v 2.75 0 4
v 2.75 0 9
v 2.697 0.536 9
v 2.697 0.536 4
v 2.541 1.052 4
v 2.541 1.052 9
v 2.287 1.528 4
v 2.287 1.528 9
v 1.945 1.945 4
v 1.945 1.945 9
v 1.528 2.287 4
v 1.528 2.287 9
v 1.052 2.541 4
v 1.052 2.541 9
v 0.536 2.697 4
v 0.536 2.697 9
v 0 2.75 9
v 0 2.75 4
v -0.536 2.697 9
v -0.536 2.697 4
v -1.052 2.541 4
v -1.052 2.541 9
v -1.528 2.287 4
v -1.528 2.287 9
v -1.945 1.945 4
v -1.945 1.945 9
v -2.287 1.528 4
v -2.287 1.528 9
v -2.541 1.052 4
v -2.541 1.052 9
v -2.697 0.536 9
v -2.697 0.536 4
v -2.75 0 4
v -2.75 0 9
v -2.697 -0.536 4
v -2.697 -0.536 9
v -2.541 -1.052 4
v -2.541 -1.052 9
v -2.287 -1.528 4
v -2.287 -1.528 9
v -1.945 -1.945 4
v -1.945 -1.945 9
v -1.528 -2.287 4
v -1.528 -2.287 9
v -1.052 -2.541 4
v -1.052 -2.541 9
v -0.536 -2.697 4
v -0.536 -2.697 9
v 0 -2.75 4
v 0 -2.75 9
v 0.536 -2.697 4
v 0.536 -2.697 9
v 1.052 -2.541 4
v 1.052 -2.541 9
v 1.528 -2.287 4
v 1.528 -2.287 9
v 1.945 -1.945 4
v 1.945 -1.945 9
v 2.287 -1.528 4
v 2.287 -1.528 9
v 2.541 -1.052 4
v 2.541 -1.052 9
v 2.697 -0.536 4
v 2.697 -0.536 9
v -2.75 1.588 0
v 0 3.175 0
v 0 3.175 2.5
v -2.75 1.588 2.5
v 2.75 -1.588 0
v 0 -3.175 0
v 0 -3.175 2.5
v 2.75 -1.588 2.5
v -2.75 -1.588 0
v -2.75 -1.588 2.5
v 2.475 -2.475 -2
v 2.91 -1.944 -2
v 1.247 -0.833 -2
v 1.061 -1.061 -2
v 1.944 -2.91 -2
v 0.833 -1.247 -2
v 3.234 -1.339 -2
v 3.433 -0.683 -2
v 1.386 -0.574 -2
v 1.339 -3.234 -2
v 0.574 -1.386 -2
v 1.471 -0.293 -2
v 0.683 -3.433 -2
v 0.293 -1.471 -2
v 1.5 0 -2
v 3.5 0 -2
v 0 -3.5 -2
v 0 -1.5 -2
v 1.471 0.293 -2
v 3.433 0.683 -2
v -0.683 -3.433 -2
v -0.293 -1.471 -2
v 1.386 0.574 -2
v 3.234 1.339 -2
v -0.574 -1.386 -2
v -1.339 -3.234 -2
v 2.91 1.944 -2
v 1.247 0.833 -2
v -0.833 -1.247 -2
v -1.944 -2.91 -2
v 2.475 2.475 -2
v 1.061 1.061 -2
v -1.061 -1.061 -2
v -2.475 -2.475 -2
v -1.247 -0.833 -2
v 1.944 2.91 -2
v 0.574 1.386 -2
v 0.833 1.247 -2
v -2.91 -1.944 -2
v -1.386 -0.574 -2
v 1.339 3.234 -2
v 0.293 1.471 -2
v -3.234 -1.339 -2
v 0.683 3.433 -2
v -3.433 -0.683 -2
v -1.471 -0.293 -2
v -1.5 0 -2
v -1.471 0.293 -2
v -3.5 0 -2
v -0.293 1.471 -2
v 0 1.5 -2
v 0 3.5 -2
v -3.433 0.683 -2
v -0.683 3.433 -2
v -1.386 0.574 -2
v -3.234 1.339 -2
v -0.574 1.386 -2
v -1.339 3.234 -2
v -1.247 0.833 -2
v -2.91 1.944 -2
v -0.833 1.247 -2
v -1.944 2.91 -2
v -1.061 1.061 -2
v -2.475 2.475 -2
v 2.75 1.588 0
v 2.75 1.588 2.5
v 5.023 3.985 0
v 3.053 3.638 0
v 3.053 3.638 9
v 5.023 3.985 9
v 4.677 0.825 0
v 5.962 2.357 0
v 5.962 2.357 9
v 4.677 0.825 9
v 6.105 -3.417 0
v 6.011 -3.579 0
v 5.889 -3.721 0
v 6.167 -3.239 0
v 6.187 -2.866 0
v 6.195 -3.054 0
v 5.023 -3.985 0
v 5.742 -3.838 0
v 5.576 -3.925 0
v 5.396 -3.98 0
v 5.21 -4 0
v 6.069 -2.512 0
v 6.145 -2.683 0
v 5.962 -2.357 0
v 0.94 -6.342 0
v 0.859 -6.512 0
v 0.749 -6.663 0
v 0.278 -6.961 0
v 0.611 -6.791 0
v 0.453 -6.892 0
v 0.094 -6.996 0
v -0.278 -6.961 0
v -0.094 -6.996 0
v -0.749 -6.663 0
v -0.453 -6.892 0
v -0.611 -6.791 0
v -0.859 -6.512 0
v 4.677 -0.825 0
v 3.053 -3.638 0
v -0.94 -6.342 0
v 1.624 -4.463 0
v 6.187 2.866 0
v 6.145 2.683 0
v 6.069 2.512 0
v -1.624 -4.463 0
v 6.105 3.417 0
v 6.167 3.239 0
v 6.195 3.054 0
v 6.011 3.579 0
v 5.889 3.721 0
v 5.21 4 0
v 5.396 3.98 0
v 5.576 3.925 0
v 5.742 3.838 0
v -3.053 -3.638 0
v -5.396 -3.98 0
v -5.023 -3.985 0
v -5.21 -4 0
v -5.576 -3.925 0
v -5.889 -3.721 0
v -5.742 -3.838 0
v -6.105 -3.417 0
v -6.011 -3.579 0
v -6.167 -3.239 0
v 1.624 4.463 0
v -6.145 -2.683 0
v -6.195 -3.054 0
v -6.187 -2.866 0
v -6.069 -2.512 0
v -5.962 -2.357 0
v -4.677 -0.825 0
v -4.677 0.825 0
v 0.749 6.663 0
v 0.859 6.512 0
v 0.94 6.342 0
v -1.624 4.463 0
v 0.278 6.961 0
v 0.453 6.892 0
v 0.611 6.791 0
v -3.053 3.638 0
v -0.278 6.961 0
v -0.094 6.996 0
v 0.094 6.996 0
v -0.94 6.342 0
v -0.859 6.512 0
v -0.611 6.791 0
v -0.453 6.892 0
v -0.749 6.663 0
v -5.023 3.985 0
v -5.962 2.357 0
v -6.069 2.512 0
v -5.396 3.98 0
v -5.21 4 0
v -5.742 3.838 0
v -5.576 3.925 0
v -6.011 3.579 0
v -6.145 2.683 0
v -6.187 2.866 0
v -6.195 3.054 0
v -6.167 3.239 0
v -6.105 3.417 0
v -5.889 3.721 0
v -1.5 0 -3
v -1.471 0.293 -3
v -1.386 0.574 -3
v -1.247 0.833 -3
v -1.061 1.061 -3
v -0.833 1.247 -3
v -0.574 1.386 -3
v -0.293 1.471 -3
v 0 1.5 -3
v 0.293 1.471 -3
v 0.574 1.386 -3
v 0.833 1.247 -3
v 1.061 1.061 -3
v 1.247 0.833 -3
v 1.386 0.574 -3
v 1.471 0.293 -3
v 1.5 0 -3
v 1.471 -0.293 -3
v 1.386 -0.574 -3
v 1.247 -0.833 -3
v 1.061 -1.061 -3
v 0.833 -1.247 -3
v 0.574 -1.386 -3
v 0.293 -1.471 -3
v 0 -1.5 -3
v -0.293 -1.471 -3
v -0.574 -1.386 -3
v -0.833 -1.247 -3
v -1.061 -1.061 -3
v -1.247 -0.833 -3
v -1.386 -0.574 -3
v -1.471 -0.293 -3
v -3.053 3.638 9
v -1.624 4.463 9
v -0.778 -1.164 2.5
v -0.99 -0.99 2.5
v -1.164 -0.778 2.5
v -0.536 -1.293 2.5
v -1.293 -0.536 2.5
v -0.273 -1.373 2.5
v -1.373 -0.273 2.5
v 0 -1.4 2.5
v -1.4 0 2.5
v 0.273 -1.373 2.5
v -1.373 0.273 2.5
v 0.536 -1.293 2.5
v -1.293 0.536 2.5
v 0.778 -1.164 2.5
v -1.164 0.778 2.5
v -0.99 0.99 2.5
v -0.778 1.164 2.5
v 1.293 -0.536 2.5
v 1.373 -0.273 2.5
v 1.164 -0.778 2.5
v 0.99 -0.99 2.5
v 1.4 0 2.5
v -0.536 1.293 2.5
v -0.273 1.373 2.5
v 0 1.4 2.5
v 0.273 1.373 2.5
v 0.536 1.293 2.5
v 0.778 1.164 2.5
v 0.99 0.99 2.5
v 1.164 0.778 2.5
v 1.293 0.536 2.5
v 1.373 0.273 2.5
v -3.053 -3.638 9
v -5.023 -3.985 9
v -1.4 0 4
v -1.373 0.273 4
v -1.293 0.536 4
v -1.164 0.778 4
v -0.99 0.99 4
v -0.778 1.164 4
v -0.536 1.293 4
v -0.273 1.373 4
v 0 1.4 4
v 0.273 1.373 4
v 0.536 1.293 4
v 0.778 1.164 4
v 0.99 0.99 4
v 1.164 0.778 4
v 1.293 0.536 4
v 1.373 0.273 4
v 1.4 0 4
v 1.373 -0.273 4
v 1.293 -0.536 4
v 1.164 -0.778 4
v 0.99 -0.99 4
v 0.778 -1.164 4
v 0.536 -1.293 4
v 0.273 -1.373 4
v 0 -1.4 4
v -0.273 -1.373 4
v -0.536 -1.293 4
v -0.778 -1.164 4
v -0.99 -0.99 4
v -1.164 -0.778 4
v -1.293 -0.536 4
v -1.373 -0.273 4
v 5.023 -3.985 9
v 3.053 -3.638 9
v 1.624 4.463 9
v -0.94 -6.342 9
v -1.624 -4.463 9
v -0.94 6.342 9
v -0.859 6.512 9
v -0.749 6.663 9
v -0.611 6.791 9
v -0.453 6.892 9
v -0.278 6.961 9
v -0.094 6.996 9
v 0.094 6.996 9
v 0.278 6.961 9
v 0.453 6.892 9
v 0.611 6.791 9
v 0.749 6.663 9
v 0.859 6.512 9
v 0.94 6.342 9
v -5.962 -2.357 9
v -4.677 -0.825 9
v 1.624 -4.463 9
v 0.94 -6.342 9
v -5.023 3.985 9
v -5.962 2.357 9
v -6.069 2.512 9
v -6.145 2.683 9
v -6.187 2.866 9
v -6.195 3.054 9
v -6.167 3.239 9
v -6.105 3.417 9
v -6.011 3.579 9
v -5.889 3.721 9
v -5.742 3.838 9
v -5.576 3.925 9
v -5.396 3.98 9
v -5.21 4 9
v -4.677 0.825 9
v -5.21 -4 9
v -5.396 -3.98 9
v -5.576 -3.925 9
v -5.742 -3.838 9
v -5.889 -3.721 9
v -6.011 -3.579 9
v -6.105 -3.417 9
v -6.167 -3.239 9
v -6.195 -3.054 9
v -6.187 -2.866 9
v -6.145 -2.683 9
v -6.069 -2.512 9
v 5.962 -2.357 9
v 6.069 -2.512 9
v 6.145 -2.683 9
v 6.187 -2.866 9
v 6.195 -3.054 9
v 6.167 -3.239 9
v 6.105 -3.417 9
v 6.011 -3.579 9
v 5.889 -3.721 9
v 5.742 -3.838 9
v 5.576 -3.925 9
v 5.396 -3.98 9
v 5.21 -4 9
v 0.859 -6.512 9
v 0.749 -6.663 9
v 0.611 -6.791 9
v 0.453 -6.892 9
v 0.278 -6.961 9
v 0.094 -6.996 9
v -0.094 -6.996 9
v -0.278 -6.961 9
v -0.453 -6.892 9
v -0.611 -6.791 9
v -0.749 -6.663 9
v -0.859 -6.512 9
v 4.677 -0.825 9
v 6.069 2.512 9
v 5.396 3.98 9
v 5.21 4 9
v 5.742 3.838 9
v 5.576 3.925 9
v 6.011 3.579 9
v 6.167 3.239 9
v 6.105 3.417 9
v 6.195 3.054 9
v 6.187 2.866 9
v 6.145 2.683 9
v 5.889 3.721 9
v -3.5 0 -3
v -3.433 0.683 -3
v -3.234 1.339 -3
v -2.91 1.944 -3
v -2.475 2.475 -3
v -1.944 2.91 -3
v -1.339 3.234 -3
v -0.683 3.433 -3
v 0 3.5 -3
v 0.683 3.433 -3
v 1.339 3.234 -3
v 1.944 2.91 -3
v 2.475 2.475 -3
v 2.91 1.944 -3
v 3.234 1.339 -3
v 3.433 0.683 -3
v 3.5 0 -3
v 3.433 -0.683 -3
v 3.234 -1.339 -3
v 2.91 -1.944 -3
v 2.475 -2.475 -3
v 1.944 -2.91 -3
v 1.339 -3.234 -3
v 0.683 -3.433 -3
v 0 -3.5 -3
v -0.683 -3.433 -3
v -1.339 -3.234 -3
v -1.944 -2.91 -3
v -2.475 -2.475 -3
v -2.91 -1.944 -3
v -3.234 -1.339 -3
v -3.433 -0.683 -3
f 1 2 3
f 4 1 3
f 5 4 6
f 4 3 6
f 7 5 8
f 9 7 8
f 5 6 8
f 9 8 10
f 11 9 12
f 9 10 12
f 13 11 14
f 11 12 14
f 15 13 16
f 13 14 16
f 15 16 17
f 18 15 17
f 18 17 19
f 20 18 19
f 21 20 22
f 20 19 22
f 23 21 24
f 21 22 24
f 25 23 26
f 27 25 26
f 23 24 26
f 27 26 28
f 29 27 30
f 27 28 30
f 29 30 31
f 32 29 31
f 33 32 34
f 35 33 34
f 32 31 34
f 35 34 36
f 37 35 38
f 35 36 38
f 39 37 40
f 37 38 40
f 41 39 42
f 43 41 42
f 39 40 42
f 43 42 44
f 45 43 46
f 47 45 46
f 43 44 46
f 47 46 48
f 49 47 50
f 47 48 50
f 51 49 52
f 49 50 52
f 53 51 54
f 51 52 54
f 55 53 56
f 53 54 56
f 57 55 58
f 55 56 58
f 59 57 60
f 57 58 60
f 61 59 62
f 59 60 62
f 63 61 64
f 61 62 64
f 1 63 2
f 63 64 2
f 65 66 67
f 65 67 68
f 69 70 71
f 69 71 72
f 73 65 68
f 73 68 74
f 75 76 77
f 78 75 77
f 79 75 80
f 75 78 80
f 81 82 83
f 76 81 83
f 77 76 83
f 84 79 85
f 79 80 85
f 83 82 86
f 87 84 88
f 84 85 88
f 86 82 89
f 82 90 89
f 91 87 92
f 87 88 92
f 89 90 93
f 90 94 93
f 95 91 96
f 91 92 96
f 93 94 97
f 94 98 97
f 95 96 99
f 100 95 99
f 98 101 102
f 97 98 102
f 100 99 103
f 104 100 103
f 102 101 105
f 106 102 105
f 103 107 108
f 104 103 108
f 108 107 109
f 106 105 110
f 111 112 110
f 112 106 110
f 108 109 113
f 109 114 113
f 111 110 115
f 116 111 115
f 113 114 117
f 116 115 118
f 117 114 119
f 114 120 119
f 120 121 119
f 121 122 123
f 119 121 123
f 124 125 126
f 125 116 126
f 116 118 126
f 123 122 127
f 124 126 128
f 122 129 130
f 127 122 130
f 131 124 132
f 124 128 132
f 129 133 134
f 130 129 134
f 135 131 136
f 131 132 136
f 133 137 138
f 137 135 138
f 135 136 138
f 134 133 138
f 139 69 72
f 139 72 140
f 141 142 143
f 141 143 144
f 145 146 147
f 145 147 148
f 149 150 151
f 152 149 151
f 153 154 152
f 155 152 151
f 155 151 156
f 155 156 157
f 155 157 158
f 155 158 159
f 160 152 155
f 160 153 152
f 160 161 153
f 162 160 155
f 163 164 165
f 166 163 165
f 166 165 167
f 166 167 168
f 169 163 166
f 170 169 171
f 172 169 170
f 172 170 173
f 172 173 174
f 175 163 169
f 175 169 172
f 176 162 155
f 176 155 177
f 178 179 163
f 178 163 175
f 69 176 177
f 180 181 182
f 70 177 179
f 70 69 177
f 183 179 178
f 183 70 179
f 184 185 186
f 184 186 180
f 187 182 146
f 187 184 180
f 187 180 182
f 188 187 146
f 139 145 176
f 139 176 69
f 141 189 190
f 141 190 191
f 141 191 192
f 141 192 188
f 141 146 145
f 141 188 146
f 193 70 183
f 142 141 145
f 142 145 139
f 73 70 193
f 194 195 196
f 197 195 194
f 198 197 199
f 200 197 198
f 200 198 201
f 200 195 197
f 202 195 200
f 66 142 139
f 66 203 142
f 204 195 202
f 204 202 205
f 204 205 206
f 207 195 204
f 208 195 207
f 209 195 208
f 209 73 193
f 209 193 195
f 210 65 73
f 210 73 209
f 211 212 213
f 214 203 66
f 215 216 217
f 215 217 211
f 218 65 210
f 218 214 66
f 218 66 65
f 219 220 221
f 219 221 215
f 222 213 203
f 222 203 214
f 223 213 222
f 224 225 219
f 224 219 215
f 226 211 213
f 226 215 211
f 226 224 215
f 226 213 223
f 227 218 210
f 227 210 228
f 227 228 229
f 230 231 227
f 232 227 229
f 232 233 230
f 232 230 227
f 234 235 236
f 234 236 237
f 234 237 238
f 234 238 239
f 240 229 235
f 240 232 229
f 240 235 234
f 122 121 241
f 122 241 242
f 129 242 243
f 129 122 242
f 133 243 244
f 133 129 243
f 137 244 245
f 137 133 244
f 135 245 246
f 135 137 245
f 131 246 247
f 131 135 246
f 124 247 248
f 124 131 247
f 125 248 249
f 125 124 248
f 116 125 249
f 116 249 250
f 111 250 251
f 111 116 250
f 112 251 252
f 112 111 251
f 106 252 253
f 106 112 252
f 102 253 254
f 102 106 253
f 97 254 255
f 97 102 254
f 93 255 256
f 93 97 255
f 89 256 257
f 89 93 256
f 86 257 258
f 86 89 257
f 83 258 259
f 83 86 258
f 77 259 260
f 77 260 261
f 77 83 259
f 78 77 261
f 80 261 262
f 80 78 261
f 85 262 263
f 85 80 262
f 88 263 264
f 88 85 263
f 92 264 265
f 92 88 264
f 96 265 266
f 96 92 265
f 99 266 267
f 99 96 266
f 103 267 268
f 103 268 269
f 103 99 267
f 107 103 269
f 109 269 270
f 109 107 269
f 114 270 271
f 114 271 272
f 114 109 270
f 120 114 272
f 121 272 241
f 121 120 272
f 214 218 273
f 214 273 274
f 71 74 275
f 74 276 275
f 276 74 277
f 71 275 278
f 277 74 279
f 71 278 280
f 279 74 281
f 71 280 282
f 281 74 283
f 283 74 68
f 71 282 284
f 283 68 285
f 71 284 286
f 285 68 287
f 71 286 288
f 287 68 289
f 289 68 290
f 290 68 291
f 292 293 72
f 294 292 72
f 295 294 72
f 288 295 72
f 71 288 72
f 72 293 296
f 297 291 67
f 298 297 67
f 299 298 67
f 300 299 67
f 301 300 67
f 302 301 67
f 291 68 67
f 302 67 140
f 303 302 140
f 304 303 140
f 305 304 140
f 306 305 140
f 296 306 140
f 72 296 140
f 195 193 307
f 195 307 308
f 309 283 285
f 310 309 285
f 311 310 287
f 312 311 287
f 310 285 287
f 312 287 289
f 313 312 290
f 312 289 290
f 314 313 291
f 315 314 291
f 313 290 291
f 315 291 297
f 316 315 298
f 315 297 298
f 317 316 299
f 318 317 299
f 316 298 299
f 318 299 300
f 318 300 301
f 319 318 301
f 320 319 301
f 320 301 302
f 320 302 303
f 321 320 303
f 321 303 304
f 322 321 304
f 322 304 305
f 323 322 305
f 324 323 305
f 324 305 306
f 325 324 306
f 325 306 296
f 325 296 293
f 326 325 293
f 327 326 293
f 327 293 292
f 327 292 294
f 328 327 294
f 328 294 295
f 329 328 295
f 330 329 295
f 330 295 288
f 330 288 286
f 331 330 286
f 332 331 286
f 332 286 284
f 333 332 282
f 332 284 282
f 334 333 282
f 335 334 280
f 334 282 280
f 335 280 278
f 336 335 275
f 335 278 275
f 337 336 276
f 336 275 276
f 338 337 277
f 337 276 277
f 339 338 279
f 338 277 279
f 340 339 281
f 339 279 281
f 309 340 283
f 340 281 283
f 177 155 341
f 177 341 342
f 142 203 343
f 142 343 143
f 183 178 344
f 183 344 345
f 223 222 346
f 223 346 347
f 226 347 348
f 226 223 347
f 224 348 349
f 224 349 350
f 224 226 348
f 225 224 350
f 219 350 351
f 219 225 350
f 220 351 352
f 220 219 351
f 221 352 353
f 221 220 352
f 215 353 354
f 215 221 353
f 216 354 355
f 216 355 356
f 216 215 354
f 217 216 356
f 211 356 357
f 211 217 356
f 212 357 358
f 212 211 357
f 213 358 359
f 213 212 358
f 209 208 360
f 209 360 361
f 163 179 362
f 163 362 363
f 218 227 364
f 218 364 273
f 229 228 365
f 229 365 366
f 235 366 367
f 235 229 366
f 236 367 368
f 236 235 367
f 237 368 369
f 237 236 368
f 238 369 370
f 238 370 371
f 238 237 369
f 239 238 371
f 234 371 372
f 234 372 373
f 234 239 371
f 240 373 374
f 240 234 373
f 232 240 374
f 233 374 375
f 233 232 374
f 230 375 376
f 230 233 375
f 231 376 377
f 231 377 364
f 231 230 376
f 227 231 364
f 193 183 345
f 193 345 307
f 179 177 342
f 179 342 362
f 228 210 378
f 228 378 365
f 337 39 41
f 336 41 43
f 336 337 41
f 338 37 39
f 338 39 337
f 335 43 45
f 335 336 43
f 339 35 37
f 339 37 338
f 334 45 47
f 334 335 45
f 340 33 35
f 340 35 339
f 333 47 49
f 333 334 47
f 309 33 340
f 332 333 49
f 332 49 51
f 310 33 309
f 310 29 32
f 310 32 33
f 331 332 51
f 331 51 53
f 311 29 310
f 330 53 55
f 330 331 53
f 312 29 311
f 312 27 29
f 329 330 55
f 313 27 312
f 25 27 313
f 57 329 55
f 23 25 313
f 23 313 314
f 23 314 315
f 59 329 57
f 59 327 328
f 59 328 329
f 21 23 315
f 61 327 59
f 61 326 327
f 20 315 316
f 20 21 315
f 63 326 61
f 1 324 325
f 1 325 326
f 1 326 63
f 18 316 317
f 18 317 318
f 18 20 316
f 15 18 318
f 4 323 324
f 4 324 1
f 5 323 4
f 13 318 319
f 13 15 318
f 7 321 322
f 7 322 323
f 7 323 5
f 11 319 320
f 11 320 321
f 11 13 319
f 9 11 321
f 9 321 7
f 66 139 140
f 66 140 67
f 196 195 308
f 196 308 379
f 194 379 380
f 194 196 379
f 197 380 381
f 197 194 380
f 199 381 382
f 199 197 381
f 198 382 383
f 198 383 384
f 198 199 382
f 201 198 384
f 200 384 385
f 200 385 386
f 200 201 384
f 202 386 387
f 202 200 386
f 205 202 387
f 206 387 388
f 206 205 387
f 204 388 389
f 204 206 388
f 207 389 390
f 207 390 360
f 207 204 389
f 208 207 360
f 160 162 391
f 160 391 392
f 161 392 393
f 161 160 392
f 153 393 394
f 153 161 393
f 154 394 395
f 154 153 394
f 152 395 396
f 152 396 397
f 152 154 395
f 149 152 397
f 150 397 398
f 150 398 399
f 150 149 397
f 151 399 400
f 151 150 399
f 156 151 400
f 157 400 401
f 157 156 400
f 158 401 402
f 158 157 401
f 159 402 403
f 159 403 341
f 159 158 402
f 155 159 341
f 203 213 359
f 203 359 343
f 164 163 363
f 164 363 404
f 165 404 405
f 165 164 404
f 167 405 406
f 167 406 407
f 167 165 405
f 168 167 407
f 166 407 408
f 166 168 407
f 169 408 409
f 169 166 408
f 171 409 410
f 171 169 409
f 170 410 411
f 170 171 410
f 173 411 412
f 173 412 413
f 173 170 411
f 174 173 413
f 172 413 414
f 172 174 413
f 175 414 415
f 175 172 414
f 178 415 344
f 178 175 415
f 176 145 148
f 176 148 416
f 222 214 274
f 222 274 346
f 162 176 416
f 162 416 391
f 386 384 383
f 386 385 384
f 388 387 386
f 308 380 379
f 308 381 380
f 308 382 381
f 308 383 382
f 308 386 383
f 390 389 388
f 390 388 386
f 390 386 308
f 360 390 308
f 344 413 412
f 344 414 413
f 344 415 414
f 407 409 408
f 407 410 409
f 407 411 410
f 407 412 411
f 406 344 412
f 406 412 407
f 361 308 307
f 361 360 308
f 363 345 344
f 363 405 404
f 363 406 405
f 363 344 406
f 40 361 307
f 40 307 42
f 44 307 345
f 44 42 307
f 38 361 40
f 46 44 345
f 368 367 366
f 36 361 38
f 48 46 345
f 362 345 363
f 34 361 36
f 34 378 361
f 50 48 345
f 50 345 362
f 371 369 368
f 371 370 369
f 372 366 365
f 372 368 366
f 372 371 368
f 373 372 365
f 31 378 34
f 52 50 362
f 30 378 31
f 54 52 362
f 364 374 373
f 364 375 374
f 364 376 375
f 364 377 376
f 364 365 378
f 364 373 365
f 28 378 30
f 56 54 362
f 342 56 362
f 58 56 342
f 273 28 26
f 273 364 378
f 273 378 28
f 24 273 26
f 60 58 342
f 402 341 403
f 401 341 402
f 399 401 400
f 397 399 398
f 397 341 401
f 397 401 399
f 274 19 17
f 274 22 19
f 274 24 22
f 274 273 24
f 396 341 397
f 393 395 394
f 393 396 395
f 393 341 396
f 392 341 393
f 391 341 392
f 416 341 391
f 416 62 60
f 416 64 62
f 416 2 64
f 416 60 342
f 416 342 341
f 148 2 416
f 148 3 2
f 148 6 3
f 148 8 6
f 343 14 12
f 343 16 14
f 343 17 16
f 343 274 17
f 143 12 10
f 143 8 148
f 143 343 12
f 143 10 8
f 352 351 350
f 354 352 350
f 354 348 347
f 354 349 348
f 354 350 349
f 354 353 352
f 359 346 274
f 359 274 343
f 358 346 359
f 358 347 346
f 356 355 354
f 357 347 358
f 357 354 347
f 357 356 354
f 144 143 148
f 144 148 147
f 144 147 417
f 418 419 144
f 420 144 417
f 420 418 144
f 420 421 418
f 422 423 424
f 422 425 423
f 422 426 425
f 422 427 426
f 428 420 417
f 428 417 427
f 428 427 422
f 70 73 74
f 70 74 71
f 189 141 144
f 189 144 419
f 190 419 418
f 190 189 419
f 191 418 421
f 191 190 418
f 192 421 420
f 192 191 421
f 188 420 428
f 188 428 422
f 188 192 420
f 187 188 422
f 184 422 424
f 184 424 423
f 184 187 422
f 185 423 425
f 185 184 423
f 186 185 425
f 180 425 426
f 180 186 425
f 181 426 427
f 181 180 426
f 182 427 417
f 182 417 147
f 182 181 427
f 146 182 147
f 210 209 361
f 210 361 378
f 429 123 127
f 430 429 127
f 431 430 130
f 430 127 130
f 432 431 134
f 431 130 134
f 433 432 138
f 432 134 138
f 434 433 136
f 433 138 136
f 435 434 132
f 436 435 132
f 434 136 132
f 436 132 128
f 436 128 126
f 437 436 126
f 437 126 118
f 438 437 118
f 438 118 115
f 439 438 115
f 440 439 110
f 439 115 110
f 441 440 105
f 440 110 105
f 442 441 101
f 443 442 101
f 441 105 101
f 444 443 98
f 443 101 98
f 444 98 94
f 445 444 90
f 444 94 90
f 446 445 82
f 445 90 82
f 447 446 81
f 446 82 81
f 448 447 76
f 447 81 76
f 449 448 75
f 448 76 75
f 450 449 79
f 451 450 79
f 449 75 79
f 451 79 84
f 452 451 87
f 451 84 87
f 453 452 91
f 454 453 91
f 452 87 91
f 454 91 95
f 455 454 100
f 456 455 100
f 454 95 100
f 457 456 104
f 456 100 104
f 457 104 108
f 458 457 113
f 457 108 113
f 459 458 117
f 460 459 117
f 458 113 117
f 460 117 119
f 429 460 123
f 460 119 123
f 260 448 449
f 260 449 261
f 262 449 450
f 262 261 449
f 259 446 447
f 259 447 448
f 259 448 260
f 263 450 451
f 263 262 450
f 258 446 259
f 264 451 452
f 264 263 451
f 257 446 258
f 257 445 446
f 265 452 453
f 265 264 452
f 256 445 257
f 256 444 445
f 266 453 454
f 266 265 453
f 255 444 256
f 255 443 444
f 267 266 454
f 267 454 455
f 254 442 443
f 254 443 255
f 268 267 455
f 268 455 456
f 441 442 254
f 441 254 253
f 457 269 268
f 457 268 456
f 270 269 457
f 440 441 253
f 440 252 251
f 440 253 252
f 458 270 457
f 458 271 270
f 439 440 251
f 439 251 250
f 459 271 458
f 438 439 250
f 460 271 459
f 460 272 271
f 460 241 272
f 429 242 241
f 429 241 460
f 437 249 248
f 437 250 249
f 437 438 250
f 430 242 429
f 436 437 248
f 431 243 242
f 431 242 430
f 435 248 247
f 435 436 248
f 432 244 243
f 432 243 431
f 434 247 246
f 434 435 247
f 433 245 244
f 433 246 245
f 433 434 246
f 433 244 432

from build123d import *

# Parameters (mm, degrees)
BOSS_EXTRUDE1_DEPTH = 9
SKETCH5_R           = 1.4
BOSS_EXTRUDE2_DEPTH = 6.5
SKETCH6_R           = 2.75
CUT_EXTRUDE1_DEPTH  = 5
SKETCH9_R           = 3.5
SKETCH9_R_2         = 1.5
BOSS_EXTRUDE3_DEPTH = 1


with BuildPart() as part:
    # Sketch1 → Boss-Extrude1 (new body)
    with BuildSketch(Plane.XY):
        with BuildLine():
            Line((-1.623732907, 4.462634902), (-0.939692621, 6.342020143))
            ThreePointArc((-0.939692621, 6.342020143), (0, 7), (0.939692621, 6.342020143))
            Line((0.939692621, 6.342020143), (1.623732907, 4.462634902))
            Line((1.623732907, 4.462634902), (3.052888739, 3.637511398))
            Line((3.052888739, 3.637511398), (5.022504245, 3.984807753))
            ThreePointArc((5.022504245, 3.984807753), (6.062177826, 3.5), (5.962196866, 2.35721239))
            Line((5.962196866, 2.35721239), (4.676621646, 0.825123504))
            Line((4.676621646, 0.825123504), (4.676621646, -0.825123504))
            Line((4.676621646, -0.825123504), (5.962196866, -2.35721239))
            ThreePointArc((5.962196866, -2.35721239), (6.062177826, -3.5), (5.022504245, -3.984807753))
            Line((5.022504245, -3.984807753), (3.052888739, -3.637511398))
            Line((3.052888739, -3.637511398), (1.623732907, -4.462634902))
            Line((1.623732907, -4.462634902), (0.939692621, -6.342020143))
            ThreePointArc((0.939692621, -6.342020143), (0, -7), (-0.939692621, -6.342020143))
            Line((-0.939692621, -6.342020143), (-1.623732907, -4.462634902))
            Line((-1.623732907, -4.462634902), (-3.052888739, -3.637511398))
            Line((-3.052888739, -3.637511398), (-5.022504245, -3.984807753))
            ThreePointArc((-5.022504245, -3.984807753), (-6.062177826, -3.5), (-5.962196866, -2.35721239))
            Line((-5.962196866, -2.35721239), (-4.676621646, -0.825123504))
            Line((-4.676621646, -0.825123504), (-4.676621646, 0.825123504))
            Line((-4.676621646, 0.825123504), (-5.962196866, 2.35721239))
            ThreePointArc((-5.962196866, 2.35721239), (-6.062177826, 3.5), (-5.022504245, 3.984807753))
            Line((-5.022504245, 3.984807753), (-3.052888739, 3.637511398))
            Line((-3.052888739, 3.637511398), (-1.623732907, 4.462634902))
        make_face()
        Polygon((2.75, -1.58771324), (2.75, 1.58771324), (0, 3.175426481), (-2.75, 1.58771324), (-2.75, -1.58771324), (0, -3.175426481), align=None, mode=Mode.SUBTRACT)
    extrude(amount=BOSS_EXTRUDE1_DEPTH)

    # Sketch5 → Boss-Extrude2 (add)
    with BuildSketch(Plane(origin=(0, 0, 2.5), x_dir=(-1, 0, 0), z_dir=(0, 0, -1))):
        Polygon((-2.75, 1.58771324), (0, 3.175426481), (2.75, 1.58771324), (2.75, -1.58771324), (0, -3.175426481), (-2.75, -1.58771324), align=None)
        Circle(SKETCH5_R, mode=Mode.SUBTRACT)
    extrude(amount=-BOSS_EXTRUDE2_DEPTH)

    # Sketch6 → Cut-Extrude1 (cut)
    with BuildSketch(Plane.XY.offset(9)):
        Circle(SKETCH6_R)
    extrude(amount=-CUT_EXTRUDE1_DEPTH, mode=Mode.SUBTRACT)


with BuildPart() as body_2:
    # Sketch9 → Boss-Extrude3 (new body)
    with BuildSketch(Plane(origin=(0, 0, -2), x_dir=(-1, 0, 0), z_dir=(0, 0, -1))):
        Circle(SKETCH9_R)
        Circle(SKETCH9_R_2, mode=Mode.SUBTRACT)
    extrude(amount=BOSS_EXTRUDE3_DEPTH)


solid = Compound([part.part, body_2.part])
